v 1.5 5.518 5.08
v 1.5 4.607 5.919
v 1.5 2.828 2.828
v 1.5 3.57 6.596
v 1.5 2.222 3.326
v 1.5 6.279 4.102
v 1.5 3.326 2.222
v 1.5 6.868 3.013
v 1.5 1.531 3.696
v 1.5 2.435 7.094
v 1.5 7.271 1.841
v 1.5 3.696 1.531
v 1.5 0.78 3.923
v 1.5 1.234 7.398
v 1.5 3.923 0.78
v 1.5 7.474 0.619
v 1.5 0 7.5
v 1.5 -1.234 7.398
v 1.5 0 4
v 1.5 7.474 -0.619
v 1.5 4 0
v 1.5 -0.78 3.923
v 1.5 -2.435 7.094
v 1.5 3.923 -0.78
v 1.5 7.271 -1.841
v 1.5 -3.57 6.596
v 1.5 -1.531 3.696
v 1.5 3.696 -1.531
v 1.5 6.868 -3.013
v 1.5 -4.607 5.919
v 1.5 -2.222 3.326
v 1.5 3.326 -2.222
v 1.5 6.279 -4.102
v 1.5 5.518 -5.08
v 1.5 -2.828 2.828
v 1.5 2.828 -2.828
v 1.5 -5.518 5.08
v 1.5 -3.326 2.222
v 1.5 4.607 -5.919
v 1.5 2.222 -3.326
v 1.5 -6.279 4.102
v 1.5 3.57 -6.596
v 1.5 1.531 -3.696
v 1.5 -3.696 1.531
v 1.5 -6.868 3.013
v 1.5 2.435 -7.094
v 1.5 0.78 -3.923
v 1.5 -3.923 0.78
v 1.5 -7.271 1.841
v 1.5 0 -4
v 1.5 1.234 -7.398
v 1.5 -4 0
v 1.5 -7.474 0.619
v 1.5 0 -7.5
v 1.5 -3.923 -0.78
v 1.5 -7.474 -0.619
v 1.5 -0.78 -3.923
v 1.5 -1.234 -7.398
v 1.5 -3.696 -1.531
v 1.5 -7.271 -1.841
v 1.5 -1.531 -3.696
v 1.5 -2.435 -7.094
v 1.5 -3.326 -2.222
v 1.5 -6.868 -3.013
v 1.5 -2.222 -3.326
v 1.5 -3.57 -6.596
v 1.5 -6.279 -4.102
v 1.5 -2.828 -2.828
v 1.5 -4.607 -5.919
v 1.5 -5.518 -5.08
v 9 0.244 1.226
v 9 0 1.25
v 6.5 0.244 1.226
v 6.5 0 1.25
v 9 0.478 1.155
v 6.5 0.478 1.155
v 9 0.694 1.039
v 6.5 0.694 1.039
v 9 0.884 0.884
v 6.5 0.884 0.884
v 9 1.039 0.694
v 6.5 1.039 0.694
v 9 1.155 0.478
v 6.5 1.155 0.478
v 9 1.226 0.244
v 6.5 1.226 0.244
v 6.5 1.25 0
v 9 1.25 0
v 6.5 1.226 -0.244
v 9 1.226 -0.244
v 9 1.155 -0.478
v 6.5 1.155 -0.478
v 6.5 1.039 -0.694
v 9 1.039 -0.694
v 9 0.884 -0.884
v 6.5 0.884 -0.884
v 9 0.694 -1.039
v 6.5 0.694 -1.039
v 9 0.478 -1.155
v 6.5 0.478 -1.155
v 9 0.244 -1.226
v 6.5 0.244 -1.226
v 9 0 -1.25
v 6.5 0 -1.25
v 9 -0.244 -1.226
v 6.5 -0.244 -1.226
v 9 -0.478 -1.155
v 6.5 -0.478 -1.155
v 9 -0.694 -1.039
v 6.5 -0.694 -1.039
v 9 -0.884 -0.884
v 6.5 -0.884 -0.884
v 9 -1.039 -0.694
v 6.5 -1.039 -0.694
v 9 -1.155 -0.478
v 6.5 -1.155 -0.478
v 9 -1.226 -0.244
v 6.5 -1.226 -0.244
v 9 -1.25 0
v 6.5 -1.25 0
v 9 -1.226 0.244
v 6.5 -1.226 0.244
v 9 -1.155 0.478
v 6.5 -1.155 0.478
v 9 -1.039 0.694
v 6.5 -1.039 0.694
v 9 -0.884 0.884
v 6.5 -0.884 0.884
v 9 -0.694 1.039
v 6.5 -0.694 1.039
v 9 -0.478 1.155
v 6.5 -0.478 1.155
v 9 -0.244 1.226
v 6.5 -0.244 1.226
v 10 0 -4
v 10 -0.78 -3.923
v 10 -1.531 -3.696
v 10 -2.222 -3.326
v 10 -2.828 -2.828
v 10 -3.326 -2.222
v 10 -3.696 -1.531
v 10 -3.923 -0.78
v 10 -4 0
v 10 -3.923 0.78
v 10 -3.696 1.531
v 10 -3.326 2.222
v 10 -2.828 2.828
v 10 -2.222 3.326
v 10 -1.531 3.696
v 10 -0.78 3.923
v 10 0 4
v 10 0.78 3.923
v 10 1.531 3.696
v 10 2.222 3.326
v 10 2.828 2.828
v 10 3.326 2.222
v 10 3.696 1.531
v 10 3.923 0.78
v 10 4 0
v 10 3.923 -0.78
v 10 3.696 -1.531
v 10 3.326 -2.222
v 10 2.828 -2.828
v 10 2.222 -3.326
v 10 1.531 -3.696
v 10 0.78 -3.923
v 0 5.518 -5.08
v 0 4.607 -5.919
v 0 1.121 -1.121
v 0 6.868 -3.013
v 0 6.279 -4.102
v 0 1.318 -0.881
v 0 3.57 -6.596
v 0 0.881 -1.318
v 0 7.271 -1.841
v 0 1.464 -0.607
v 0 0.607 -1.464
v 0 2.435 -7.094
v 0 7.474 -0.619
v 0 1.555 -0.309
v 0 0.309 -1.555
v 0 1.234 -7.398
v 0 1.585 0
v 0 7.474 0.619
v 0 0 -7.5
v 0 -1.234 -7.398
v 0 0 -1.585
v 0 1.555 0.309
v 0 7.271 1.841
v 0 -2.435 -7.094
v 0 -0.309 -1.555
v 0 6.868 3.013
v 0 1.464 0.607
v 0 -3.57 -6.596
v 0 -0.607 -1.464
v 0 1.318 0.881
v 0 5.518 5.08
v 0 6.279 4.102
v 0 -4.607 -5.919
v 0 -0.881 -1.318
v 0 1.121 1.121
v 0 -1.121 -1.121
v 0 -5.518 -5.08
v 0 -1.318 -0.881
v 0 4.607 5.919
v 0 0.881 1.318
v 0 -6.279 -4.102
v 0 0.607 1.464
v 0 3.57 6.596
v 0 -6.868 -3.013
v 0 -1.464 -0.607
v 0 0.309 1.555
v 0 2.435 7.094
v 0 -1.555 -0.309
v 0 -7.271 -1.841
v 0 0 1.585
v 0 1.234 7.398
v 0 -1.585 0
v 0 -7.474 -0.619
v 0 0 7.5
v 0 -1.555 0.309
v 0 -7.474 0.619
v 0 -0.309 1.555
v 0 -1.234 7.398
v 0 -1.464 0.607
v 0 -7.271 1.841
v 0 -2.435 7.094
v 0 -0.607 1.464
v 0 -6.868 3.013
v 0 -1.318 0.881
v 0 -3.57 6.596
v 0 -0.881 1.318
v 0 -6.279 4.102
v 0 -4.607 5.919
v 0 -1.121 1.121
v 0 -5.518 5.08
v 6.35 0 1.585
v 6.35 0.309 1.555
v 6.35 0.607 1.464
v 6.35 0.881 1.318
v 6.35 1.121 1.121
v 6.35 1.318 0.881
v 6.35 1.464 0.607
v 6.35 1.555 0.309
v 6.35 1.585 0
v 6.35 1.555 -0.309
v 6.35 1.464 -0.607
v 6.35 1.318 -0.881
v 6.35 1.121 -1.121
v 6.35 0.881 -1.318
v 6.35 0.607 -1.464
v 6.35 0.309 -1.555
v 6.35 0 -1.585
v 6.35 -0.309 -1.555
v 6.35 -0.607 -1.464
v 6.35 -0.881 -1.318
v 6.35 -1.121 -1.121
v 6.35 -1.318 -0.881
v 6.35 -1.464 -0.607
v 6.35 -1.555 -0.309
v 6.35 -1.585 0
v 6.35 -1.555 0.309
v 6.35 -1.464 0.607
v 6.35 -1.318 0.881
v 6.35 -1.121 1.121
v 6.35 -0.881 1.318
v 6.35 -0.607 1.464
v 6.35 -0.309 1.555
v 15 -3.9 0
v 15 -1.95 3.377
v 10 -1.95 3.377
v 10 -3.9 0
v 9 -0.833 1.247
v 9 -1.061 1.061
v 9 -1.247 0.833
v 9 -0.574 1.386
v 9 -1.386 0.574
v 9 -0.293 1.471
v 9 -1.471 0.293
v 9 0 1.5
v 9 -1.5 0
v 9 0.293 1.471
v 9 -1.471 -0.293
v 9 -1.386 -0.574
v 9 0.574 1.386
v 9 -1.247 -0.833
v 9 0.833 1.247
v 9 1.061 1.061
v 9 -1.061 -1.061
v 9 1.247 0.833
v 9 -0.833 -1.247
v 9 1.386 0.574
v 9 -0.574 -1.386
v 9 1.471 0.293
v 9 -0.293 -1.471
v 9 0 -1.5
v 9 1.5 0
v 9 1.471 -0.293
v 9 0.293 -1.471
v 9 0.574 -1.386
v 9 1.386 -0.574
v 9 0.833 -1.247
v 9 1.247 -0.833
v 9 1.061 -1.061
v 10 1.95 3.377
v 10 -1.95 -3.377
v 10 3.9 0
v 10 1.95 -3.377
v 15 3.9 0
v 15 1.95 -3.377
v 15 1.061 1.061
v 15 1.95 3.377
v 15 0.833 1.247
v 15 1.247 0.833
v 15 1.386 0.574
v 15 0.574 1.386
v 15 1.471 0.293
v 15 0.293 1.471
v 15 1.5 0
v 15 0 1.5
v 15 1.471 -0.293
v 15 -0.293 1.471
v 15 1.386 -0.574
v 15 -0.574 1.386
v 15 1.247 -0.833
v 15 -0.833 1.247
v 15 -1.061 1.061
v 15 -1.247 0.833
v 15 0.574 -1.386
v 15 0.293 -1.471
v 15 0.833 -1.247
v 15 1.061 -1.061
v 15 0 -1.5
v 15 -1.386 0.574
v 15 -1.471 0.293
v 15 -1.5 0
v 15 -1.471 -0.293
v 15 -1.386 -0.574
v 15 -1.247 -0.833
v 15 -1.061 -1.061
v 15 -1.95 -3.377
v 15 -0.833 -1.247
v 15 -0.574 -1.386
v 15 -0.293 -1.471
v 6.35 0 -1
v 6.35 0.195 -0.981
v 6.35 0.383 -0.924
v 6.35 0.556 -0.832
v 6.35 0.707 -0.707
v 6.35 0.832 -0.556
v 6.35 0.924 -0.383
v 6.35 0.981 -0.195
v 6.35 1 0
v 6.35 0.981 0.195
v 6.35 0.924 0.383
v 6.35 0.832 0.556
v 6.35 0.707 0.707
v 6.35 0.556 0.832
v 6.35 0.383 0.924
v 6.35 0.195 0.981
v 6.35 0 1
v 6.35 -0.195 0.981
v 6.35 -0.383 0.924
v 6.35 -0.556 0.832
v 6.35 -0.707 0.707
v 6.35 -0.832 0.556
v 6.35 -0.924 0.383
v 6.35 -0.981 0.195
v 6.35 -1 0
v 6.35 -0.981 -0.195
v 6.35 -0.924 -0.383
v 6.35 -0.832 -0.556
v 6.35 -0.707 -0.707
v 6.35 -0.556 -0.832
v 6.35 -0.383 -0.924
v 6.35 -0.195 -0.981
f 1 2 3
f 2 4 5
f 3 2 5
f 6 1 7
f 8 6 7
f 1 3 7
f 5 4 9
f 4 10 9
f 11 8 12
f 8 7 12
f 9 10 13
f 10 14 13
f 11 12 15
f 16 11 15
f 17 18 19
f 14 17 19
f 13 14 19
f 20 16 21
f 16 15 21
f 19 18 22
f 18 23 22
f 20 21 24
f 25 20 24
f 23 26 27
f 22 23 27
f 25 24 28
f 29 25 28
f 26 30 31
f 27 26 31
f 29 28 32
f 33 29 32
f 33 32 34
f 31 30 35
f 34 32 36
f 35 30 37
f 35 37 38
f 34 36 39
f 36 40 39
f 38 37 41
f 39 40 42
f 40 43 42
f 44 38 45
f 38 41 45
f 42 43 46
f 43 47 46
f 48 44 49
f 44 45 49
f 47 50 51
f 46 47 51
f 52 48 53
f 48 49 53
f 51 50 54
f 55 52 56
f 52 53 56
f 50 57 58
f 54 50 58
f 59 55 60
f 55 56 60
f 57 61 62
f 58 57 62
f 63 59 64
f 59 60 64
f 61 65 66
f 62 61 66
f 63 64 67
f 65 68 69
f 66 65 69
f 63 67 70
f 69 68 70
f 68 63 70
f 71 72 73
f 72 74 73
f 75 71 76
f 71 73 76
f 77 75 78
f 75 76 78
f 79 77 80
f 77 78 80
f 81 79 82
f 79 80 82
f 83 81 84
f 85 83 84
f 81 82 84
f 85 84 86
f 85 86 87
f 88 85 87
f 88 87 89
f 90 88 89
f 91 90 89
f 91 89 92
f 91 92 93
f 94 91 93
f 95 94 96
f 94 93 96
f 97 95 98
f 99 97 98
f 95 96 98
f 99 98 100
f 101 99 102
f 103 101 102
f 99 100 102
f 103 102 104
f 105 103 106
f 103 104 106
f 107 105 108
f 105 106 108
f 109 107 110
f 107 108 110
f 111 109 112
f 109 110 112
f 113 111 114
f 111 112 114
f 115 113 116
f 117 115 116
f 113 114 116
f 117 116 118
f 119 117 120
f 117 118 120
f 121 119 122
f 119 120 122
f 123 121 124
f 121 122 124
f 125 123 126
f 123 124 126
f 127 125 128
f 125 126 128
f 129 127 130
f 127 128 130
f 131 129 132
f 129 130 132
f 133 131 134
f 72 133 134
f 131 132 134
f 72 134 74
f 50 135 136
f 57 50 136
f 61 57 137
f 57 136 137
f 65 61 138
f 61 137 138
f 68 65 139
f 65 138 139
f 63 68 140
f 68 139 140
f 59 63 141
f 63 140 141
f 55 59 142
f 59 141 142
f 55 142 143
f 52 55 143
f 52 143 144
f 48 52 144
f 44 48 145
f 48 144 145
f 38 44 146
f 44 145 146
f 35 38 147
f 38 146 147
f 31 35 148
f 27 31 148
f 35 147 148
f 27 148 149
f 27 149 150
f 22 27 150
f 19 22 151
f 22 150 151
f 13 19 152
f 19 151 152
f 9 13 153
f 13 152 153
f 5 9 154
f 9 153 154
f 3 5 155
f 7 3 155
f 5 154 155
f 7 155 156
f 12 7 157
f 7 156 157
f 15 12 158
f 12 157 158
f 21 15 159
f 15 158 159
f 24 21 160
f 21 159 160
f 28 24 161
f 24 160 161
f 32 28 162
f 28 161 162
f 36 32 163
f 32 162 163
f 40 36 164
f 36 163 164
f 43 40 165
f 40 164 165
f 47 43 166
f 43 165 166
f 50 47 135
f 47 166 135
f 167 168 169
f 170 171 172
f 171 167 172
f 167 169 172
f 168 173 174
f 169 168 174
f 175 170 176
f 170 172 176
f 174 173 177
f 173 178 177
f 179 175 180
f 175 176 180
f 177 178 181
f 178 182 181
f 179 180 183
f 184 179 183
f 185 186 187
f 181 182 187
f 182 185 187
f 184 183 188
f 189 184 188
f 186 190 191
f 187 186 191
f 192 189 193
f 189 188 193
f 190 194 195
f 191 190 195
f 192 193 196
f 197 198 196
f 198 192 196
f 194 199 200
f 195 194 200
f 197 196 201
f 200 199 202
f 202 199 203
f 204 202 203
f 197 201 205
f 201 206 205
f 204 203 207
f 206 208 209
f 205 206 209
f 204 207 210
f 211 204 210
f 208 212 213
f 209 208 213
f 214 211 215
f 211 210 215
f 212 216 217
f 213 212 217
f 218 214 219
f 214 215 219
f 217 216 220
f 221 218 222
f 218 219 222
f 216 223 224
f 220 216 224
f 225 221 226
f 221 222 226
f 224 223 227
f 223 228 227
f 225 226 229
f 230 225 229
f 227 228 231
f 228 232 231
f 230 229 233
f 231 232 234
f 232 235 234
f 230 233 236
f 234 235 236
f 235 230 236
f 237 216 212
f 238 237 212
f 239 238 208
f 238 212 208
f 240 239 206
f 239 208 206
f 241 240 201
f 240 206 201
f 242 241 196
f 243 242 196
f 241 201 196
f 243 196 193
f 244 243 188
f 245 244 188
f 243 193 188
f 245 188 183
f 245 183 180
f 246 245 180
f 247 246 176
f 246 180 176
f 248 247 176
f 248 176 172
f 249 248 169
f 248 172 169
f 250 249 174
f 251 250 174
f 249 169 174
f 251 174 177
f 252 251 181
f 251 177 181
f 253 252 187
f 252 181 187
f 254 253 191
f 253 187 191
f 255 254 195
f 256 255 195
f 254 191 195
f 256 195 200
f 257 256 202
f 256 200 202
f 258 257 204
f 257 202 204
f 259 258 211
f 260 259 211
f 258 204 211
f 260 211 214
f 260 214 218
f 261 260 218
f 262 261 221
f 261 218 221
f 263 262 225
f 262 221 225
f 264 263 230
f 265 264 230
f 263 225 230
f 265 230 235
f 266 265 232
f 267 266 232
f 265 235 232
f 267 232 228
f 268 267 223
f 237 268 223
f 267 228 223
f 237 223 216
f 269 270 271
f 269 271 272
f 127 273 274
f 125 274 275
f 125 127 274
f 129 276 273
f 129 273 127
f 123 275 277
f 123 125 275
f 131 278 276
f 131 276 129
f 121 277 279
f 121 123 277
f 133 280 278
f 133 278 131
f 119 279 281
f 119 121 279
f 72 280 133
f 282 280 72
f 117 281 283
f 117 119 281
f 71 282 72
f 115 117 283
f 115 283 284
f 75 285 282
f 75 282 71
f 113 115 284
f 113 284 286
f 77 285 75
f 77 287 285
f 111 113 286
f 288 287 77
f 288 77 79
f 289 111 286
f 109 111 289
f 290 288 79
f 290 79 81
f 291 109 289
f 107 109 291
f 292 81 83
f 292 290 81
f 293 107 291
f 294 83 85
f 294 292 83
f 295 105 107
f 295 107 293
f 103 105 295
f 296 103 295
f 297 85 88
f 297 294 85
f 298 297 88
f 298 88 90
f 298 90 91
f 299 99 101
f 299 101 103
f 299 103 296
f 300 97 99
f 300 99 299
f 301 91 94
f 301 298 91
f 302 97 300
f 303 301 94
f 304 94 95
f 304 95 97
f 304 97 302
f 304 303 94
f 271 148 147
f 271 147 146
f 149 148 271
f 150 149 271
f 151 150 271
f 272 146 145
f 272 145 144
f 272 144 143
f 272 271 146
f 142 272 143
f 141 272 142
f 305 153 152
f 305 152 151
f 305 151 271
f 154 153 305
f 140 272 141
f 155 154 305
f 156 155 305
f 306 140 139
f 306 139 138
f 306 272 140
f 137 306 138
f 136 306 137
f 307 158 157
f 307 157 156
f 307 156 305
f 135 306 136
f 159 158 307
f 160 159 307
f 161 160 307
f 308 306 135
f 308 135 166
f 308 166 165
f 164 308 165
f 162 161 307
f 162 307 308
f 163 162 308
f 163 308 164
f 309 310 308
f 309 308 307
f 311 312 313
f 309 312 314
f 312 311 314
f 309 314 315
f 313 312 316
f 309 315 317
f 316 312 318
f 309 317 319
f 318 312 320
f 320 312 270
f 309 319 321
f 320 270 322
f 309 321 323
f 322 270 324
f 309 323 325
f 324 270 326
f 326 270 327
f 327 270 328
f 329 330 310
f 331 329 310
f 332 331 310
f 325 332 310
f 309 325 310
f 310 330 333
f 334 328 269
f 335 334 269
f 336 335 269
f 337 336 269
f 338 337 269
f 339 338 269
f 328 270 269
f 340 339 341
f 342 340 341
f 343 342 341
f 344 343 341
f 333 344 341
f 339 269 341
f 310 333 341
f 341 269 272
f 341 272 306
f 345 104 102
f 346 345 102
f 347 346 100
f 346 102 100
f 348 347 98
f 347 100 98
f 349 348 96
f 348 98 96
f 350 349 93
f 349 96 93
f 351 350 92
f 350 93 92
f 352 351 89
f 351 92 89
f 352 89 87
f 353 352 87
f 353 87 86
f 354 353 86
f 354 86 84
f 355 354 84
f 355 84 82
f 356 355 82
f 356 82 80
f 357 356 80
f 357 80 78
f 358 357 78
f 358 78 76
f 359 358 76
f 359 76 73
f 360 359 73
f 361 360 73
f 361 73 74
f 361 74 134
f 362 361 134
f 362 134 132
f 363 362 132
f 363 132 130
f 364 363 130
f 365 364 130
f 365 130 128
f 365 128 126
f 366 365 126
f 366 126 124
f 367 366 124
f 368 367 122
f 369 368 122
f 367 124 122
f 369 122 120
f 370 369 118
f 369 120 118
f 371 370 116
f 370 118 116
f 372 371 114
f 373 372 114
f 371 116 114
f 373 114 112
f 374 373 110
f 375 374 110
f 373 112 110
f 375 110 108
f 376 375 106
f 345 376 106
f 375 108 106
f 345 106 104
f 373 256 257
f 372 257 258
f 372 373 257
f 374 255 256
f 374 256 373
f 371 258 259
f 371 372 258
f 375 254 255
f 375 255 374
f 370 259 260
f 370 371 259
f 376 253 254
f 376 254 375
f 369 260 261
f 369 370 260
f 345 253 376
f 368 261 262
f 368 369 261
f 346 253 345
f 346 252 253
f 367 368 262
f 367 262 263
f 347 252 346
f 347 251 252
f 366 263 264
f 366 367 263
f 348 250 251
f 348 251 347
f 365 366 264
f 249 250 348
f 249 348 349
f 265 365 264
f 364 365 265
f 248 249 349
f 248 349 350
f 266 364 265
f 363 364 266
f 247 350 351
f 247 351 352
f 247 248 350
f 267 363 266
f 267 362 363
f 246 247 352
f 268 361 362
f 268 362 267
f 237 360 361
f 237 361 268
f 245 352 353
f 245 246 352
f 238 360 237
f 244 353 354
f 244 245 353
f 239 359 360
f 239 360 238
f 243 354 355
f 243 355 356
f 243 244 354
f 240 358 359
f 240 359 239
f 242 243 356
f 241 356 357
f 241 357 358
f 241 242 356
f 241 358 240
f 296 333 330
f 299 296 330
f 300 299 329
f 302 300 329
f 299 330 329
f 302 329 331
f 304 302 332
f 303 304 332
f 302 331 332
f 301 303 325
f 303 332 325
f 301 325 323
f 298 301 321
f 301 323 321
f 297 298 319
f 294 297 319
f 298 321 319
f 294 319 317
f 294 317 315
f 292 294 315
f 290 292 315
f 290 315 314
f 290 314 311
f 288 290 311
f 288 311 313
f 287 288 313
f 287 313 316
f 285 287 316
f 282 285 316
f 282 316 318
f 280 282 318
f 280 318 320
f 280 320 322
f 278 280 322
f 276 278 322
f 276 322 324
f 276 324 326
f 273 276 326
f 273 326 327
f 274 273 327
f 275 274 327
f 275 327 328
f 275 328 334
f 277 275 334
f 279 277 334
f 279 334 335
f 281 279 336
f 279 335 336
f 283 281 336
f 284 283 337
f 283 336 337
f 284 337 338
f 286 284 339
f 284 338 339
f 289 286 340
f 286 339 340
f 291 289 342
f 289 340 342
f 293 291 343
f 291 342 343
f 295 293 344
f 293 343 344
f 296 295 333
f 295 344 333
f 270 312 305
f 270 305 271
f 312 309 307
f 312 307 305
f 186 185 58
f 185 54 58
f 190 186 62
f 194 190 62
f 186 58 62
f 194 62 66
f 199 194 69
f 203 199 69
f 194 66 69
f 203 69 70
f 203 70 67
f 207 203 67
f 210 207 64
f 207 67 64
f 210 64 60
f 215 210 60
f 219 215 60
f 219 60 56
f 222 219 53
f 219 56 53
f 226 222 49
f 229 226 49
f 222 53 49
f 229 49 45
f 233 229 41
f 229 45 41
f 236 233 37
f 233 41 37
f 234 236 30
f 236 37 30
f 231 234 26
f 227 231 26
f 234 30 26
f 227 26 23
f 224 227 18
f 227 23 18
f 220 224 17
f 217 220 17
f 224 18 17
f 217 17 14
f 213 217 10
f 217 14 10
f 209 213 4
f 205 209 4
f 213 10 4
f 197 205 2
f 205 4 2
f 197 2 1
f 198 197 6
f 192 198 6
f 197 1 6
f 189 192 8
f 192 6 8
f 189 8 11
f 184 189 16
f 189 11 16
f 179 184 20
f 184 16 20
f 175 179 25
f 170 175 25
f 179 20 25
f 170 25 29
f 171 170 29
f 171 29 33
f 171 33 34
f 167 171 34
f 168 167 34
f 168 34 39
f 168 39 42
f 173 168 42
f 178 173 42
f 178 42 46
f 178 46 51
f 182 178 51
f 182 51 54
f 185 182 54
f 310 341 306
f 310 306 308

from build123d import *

# Parameters (mm, degrees)
SKETCH2_OUTSIDE_W               = 22.196
SKETCH2_OUTSIDE_H               = 22.196
CUT_EXTRUDE1_DEPTH              = 5
M3X0_5_TAPPED_HOLE4_D           = 2.5
M3X0_5_TAPPED_HOLE4_DEPTH       = 8.5
M3X0_5_TAPPED_HOLE4_CBORE_D     = 3
M3X0_5_TAPPED_HOLE4_CBORE_DEPTH = 6
M3X0_5_TAPPED_HOLE4_TIP         = 0.751075774
SKETCH7_R                       = 1.58496
CUT_EXTRUDE2_DEPTH              = 6.35


with BuildPart() as part:
    # Sketch1 → Revolve1 (revolve)
    with BuildSketch(Plane(origin=(0, 0, 0), x_dir=(1, 0, 0), z_dir=(0, 1, 0))):
        Polygon((1.5, 4), (15, 4), (15, 0), (0, 0), (0, 7.5), (1.5, 7.5), align=None)
    revolve(axis=Axis((15, 0, 0), (-1, 0, 0)))

    # Sketch2 outside → Cut-Extrude1 (cut)
    with BuildSketch(Plane(origin=(15, 0, 0), x_dir=(0, 0, -1), z_dir=(1, 0, 0))):
        Rectangle(SKETCH2_OUTSIDE_W, SKETCH2_OUTSIDE_H)
        Polygon((0, 3.9), (-3.377499075, 1.95), (-3.377499075, -1.95), (0, -3.9), (3.377499075, -1.95), (3.377499075, 1.95), align=None, mode=Mode.SUBTRACT)
    extrude(amount=-CUT_EXTRUDE1_DEPTH, mode=Mode.SUBTRACT)

    # M3x0.5 Tapped Hole4
    with Locations(Plane(origin=(15, 0, 0), x_dir=(0, 0, -1), z_dir=(1, 0, 0))):
        with Locations((0, 0)):
            CounterBoreHole(M3X0_5_TAPPED_HOLE4_D / 2, M3X0_5_TAPPED_HOLE4_CBORE_D / 2, M3X0_5_TAPPED_HOLE4_CBORE_DEPTH, depth=M3X0_5_TAPPED_HOLE4_DEPTH)
            with Locations((0, 0, -(M3X0_5_TAPPED_HOLE4_DEPTH + M3X0_5_TAPPED_HOLE4_TIP / 2))):  # 118° drill point
                Cone(0, M3X0_5_TAPPED_HOLE4_D / 2, M3X0_5_TAPPED_HOLE4_TIP, mode=Mode.SUBTRACT)

    # Sketch7 → Cut-Extrude2 (cut)
    with BuildSketch(Plane.ZY):
        Circle(SKETCH7_R)
    extrude(amount=-CUT_EXTRUDE2_DEPTH, mode=Mode.SUBTRACT)


solid = part.part
